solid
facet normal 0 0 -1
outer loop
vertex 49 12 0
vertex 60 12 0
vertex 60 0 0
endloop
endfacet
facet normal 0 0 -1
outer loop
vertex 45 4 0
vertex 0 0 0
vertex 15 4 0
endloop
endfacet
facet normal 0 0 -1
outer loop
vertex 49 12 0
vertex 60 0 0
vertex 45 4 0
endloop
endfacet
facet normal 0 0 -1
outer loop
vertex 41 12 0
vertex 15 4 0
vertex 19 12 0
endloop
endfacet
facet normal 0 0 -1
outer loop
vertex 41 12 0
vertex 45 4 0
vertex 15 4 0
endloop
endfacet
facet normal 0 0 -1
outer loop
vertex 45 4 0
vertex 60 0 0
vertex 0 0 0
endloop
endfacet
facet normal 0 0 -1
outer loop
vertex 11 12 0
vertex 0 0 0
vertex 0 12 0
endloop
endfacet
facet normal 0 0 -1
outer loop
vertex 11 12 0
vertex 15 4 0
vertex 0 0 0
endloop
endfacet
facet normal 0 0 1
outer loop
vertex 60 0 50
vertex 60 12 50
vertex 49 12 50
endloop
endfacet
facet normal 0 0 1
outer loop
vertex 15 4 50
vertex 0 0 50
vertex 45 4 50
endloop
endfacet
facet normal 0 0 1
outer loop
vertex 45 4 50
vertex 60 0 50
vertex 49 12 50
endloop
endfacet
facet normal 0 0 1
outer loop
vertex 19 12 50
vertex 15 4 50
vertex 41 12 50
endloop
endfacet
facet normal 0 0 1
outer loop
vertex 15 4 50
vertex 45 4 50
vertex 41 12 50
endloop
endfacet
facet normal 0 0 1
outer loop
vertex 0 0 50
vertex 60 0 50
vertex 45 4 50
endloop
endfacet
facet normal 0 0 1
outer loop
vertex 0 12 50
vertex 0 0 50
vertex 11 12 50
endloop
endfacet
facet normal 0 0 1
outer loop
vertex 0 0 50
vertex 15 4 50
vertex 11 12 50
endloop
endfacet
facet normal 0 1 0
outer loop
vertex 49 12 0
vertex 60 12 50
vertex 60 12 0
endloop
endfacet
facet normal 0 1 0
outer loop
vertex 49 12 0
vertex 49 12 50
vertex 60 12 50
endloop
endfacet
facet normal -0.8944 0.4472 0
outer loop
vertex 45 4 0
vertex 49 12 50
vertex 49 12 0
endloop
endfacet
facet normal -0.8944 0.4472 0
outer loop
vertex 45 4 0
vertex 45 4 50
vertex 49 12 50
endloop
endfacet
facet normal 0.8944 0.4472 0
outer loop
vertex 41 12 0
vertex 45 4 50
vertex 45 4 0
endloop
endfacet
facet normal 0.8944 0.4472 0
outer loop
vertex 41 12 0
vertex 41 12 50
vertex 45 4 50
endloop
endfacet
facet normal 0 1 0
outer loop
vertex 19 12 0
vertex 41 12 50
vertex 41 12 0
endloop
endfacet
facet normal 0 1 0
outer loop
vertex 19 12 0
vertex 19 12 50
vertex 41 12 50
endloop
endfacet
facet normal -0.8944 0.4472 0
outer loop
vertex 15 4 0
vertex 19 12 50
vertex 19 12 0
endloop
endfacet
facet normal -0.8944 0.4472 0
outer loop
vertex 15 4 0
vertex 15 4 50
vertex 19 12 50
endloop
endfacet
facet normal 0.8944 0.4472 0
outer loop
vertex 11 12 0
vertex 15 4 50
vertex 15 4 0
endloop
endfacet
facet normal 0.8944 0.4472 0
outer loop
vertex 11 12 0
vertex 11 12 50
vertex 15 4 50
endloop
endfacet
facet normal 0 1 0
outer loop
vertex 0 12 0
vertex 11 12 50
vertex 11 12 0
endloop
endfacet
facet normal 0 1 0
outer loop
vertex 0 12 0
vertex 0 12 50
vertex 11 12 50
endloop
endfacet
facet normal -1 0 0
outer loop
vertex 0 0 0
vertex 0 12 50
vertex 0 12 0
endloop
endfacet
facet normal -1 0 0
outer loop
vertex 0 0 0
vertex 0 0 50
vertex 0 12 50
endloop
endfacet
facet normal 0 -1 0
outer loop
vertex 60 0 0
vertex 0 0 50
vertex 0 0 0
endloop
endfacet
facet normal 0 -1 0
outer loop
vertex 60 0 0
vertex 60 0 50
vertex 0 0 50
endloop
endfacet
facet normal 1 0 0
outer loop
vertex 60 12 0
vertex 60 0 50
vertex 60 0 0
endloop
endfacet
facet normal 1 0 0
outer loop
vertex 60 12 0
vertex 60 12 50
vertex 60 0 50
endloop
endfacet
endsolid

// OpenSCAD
$fn = 32;

// ----------------------------------------------------------------------
// V guide rail: doublev, 60 mm wide
// ----------------------------------------------------------------------

// --- parameters (mm) ---
rail_w = 60;              // rail width, X
base_t = 12;              // base plate thickness
v_depth = 8;              // V feature depth / height
v_half_w = 8;             // half width of the V at the base face
plate_t = 50;             // rail length, Z (the extrusion height)
groove_off = 15;          // offset of each groove from the centreline

centre_x = rail_w / 2;  // rail centreline
groove_a = centre_x - groove_off;  // axis of the first groove
groove_b = centre_x + groove_off;  // axis of the second groove

profile = [[0, 0], [60, 0], [60, 12], [49, 12], [45, 4], [41, 12], [19, 12], [15, 4], [11, 12], [0, 12]];  // primary outline, 10 points, counter clockwise

// --- the one profile operation ---
linear_extrude(height = plate_t) polygon(points = profile);
